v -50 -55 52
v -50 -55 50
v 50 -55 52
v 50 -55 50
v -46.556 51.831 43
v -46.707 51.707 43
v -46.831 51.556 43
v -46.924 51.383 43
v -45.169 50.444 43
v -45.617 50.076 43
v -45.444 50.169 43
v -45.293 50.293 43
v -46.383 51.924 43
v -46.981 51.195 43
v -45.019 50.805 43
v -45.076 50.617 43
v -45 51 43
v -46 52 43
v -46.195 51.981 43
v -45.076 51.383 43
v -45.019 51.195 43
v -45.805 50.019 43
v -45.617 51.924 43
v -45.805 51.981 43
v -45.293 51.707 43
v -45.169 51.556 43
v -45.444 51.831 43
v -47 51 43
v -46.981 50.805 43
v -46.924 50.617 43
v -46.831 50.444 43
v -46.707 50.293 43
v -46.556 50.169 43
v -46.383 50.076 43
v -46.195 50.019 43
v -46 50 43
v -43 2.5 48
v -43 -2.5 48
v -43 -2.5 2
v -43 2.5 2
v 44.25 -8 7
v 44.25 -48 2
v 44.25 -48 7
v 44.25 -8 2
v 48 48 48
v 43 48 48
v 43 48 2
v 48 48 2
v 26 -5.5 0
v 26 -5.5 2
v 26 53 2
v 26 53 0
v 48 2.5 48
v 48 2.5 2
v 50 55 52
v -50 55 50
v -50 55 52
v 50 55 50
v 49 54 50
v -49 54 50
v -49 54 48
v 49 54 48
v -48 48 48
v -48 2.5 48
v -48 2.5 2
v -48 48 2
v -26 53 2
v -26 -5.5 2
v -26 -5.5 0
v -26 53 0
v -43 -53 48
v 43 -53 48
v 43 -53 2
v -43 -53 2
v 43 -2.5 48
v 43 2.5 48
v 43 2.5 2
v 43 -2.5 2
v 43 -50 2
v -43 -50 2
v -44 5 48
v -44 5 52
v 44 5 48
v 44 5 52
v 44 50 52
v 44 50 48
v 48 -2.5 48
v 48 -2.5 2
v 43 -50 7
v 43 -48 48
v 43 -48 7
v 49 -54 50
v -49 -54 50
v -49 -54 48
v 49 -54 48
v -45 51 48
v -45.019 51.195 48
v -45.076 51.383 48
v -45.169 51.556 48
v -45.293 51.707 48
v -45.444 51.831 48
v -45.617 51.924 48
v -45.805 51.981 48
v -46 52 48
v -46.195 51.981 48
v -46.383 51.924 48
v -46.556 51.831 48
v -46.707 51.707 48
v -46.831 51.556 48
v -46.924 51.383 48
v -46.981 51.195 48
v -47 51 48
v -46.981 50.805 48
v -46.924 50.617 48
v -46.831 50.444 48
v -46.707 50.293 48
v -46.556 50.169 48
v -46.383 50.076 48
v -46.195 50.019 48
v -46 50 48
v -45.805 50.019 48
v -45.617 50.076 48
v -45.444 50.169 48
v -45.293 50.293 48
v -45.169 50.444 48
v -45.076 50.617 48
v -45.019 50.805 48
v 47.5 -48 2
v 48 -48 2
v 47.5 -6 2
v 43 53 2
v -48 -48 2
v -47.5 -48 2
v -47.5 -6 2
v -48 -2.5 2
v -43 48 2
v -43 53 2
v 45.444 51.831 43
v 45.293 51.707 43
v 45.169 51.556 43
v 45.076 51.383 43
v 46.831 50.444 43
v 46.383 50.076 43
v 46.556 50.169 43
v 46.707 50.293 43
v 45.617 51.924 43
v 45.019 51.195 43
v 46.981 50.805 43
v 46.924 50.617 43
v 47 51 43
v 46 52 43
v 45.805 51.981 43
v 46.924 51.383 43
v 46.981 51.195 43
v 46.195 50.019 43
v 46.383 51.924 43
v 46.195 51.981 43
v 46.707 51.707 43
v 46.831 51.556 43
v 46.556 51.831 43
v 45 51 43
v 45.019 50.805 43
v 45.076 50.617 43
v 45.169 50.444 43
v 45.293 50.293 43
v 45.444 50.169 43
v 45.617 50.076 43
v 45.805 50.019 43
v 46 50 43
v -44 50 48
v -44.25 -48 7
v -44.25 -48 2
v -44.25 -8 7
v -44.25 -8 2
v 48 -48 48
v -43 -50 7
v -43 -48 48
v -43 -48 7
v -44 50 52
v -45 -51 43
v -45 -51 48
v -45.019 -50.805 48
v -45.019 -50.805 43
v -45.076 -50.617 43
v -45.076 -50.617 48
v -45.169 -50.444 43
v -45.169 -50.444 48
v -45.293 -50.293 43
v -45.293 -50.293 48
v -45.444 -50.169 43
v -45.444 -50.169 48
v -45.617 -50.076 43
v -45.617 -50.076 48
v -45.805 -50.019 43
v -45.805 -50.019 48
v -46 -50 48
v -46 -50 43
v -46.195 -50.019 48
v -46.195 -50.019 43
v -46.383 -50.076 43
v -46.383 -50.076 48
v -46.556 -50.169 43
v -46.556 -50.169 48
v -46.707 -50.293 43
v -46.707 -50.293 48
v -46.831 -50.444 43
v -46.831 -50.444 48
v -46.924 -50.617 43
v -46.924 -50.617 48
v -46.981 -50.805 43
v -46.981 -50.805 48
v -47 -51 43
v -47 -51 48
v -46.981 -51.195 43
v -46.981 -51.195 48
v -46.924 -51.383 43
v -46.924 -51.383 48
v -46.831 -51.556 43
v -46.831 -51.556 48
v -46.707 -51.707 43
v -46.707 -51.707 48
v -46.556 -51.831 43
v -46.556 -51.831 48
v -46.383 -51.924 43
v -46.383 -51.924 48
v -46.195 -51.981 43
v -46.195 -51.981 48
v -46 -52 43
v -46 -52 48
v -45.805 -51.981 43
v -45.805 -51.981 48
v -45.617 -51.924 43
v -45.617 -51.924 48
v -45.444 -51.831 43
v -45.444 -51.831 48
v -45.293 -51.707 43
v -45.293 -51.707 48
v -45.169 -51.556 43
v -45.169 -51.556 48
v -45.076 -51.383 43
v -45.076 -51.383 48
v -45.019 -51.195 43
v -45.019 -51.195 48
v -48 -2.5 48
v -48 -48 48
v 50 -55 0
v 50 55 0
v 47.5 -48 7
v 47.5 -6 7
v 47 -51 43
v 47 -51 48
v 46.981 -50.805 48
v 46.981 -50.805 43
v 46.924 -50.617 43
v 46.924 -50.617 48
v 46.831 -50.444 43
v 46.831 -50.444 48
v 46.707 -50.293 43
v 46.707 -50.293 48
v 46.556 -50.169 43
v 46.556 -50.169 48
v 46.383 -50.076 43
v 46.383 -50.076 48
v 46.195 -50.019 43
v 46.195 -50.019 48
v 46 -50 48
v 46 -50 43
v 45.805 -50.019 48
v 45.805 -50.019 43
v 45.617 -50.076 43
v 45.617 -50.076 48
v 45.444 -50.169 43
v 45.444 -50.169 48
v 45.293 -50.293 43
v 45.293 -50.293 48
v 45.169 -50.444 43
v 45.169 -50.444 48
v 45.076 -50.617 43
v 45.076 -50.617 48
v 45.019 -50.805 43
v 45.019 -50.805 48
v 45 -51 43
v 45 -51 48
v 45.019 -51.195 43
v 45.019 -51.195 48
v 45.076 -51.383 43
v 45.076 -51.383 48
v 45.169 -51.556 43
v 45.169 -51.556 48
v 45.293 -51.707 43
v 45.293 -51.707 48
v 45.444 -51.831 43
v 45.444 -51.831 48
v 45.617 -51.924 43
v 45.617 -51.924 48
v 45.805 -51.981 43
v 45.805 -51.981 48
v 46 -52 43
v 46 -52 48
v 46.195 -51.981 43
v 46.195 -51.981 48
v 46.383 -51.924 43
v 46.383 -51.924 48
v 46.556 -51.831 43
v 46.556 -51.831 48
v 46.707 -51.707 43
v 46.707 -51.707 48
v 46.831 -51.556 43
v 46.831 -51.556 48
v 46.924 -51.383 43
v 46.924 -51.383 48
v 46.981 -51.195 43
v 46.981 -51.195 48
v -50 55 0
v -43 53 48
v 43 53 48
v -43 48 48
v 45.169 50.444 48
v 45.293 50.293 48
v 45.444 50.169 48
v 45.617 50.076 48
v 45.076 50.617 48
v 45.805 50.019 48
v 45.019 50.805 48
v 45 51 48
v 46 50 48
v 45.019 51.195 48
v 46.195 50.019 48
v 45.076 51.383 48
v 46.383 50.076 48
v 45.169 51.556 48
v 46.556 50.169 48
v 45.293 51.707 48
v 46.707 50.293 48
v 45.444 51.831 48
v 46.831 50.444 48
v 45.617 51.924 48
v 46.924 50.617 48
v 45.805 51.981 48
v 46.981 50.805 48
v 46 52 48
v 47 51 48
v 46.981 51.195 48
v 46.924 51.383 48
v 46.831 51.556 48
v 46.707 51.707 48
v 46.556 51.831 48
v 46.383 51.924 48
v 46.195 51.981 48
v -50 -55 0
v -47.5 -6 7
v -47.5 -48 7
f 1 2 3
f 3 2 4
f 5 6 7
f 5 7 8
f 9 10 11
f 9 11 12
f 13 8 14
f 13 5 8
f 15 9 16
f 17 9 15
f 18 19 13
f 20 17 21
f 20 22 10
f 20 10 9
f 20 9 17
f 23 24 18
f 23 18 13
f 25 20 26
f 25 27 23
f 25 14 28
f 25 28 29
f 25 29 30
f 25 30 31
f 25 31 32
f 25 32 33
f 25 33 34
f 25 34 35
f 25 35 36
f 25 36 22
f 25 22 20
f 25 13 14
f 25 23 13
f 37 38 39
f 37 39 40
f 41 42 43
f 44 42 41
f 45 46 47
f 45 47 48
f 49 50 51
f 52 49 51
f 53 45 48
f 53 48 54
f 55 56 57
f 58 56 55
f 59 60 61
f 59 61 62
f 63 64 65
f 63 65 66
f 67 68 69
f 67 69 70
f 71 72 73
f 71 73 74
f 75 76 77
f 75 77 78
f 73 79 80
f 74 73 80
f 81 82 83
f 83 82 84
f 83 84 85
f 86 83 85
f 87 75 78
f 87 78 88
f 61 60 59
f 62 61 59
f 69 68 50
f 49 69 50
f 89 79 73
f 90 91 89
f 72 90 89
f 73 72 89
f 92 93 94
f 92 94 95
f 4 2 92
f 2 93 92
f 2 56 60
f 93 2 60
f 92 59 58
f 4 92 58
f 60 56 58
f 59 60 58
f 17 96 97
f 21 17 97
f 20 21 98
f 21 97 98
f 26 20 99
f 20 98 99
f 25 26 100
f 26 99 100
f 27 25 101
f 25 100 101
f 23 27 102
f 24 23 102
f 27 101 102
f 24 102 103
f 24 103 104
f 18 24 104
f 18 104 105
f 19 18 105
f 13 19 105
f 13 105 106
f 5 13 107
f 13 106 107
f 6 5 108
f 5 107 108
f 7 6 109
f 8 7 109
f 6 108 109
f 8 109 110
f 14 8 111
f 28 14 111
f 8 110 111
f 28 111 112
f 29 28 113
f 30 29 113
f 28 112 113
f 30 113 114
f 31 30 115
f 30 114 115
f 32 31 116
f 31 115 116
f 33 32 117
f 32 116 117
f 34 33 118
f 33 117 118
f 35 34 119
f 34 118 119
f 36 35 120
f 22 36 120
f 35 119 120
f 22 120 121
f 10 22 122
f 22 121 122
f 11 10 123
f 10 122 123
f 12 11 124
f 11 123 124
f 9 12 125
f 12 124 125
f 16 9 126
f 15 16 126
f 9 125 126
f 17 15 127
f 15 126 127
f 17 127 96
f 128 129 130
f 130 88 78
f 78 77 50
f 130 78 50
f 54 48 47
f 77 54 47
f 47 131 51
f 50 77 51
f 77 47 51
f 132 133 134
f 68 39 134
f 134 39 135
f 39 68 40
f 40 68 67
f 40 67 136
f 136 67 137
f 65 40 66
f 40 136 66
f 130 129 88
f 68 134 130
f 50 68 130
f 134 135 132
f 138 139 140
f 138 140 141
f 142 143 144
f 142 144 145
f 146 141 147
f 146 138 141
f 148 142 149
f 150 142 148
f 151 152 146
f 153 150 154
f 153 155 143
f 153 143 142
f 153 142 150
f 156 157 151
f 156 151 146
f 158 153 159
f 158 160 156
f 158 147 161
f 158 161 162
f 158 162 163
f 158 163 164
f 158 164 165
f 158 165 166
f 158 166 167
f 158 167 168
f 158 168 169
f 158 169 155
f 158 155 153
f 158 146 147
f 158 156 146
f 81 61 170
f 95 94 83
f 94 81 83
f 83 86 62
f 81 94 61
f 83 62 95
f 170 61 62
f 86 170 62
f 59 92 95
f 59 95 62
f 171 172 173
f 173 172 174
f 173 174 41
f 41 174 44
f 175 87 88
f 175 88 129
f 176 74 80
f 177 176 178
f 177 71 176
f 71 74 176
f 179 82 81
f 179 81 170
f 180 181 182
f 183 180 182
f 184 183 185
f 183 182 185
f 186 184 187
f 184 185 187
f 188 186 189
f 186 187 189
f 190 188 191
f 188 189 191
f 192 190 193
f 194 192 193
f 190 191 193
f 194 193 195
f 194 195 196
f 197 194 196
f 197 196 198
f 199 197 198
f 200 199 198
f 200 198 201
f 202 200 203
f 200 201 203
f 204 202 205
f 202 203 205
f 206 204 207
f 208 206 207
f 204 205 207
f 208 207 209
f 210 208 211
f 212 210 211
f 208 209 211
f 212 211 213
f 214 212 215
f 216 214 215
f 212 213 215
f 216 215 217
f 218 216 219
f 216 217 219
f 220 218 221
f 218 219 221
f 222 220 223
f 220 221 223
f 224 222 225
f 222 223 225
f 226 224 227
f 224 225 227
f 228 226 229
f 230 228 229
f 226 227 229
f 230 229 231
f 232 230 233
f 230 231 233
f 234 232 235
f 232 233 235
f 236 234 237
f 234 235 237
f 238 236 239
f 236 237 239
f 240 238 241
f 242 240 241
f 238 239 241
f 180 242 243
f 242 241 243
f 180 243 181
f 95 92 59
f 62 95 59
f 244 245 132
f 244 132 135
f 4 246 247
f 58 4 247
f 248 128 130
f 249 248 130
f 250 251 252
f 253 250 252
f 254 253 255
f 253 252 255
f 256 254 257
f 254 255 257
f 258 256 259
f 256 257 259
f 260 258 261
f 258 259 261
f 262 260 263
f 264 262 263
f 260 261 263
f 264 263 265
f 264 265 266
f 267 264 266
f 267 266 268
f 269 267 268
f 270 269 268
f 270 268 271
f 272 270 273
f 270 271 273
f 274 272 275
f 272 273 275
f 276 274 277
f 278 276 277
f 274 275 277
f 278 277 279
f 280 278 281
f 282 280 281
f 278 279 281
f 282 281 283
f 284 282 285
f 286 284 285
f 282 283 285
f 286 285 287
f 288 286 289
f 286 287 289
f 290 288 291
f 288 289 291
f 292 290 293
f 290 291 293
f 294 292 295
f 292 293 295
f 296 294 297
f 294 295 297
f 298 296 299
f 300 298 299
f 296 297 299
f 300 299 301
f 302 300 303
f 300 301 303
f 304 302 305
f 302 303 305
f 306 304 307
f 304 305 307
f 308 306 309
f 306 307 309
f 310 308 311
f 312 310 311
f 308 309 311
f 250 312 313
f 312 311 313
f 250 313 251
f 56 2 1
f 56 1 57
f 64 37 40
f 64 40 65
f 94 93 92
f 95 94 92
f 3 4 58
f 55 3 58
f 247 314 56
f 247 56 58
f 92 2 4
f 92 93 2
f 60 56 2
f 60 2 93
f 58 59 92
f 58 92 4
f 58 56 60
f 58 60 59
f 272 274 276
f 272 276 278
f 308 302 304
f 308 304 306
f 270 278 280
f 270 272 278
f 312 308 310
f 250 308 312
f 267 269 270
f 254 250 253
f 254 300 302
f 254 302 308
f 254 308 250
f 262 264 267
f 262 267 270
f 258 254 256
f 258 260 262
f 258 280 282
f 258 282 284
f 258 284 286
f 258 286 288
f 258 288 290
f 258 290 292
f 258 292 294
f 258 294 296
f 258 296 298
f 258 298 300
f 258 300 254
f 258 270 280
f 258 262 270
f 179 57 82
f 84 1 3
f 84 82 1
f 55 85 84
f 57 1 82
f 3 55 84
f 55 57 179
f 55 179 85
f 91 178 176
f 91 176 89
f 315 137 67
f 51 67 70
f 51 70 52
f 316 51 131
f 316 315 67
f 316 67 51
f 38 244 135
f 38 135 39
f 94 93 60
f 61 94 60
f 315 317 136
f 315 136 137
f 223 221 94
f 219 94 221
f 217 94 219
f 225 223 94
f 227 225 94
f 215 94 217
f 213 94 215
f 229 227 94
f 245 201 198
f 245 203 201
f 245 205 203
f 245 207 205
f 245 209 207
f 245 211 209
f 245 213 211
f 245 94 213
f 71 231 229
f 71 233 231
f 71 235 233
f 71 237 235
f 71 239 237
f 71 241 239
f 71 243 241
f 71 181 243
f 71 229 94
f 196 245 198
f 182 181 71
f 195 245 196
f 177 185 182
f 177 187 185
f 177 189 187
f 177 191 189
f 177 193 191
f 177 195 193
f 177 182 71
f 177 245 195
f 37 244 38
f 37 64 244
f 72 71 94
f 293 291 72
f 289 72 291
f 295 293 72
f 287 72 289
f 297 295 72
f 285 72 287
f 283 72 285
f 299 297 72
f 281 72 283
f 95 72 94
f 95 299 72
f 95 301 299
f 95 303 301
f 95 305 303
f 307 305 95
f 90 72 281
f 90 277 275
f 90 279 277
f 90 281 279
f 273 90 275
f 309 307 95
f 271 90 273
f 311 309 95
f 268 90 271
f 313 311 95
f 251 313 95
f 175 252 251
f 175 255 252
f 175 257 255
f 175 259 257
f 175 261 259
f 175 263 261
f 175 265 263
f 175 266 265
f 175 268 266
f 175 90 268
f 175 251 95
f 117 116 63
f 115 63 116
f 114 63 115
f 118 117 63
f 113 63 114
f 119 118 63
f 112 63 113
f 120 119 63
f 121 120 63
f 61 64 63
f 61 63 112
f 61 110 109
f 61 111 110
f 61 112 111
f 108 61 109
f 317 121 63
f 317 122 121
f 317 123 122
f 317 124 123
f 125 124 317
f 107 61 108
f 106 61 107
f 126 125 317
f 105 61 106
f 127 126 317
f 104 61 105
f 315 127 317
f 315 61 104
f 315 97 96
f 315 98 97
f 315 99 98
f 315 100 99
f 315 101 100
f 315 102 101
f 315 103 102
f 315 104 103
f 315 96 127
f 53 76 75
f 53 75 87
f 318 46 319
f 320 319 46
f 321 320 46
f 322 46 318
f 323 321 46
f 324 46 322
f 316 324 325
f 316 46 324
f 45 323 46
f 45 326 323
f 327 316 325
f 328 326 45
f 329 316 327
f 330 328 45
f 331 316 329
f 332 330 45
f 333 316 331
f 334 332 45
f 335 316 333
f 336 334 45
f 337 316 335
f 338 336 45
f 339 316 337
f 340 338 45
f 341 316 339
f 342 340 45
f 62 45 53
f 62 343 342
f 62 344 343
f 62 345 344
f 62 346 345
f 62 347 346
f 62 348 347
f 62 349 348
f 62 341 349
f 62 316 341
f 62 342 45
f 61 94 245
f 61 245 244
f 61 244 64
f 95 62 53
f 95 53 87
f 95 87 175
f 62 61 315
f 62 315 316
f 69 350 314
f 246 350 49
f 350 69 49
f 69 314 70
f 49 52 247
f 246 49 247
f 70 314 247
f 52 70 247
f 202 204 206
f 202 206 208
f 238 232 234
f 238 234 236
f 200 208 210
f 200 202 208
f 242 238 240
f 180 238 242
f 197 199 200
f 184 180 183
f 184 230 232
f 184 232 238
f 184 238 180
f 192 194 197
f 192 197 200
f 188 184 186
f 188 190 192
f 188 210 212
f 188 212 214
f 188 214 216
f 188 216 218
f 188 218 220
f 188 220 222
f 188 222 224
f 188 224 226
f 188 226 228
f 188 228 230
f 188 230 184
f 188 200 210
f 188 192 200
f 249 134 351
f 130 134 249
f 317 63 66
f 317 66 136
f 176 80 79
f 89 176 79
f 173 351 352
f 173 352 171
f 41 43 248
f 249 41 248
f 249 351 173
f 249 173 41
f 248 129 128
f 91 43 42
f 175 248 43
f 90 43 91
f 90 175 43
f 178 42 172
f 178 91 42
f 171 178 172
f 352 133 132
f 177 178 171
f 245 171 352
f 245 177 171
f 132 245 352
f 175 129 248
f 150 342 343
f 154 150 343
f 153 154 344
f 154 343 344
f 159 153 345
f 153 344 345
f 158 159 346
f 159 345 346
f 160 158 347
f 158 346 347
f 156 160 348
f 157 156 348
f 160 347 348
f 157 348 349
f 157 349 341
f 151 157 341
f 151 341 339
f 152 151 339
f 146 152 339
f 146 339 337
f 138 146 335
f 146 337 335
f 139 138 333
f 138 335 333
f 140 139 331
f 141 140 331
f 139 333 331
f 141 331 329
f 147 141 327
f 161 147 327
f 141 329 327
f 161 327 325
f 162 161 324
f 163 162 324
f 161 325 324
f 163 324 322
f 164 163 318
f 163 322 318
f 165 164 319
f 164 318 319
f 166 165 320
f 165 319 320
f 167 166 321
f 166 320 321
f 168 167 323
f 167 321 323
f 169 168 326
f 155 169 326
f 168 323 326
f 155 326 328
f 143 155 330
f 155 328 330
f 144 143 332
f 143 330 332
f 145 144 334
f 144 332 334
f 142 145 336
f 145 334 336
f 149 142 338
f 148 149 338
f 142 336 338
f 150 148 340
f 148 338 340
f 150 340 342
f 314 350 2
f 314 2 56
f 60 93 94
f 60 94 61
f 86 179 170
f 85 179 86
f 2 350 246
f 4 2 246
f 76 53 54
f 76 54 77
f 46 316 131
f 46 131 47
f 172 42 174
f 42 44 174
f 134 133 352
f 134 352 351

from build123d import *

# Parameters (mm, degrees)
SKETCH_W        = 100
SKETCH_H        = 110
PAD_DEPTH       = 50
SKETCH001_W     = 98
SKETCH001_H     = 108
POCKET_DEPTH    = 2
POCKET001_DEPTH = 46
SKETCH003_W     = 52
SKETCH003_H     = 58.5
POCKET002_DEPTH = 5
SKETCH004_W     = 95
SKETCH004_H     = 44
SKETCH004_W_2   = 88.5
SKETCH004_H_2   = 40
PAD001_DEPTH    = 5
SKETCH006_R     = 1
POCKET003_DEPTH = 5
SKETCH005_W     = 100
SKETCH005_H     = 110
PAD002_DEPTH    = 2
SKETCH007_W     = 88
SKETCH007_H     = 45
POCKET004_DEPTH = 5


with BuildPart() as pad001:
    # Sketch → Pad (new body)
    with BuildSketch(Plane.XY):
        Rectangle(SKETCH_W, SKETCH_H)
    extrude(amount=PAD_DEPTH)

    # Sketch001 → Pocket (cut)
    with BuildSketch(Plane.XY.offset(50)):
        Rectangle(SKETCH001_W, SKETCH001_H)
    extrude(amount=-POCKET_DEPTH, mode=Mode.SUBTRACT)

    # Sketch002 → Pocket001 (cut)
    with BuildSketch(Plane.XY.offset(48)):
        Polygon((-43, 53), (43, 53), (43, 48), (48, 48), (48, 2.5), (43, 2.5), (43, -2.5), (48, -2.5), (48, -48), (43, -48), (43, -53), (-43, -53), (-43, -48), (-48, -48), (-48, -2.5), (-43, -2.5), (-43, 2.5), (-48, 2.5), (-48, 48), (-43, 48), align=None)
    extrude(amount=-POCKET001_DEPTH, mode=Mode.SUBTRACT)

    # Sketch003 → Pocket002 (cut)
    with BuildSketch(Plane.XY.offset(2)):
        with Locations((0, 23.75)):
            Rectangle(SKETCH003_W, SKETCH003_H)
    extrude(amount=-POCKET002_DEPTH, mode=Mode.SUBTRACT)

    # Sketch004 → Pad001 (new body)
    with BuildSketch(Plane.XY.offset(2)):
        with Locations((0, -28)):
            Rectangle(SKETCH004_W, SKETCH004_H)
        with Locations((0, -28)):
            Rectangle(SKETCH004_W_2, SKETCH004_H_2, mode=Mode.SUBTRACT)
    extrude(amount=PAD001_DEPTH)


with BuildPart() as pocket003:
    # Pocket003 base: copy of Pad001
    add(pad001.part)

    # Sketch006 → Pocket003 (cut)
    with BuildSketch(Plane.XY.offset(48)):
        with Locations((-46, 51)):
            Circle(SKETCH006_R)
        with Locations((-46, -51)):
            Circle(SKETCH006_R)
        with Locations((46, 51)):
            Circle(SKETCH006_R)
        with Locations((46, -51)):
            Circle(SKETCH006_R)
    extrude(amount=-POCKET003_DEPTH, mode=Mode.SUBTRACT)


with BuildPart() as pocket004:
    # Pad002 base: copy of Pad001
    add(pad001.part)

    # Sketch005 → Pad002 (new body, symmetric)
    with BuildSketch(Plane.XY.offset(50)):
        Rectangle(SKETCH005_W, SKETCH005_H)
    extrude(amount=PAD002_DEPTH, both=True)

    # Cut: cut Pad001
    add(pad001.part, mode=Mode.SUBTRACT)

    # Sketch007 → Pocket004 (cut)
    with BuildSketch(Plane.XY.offset(52)):
        with Locations((0, 27.5)):
            Rectangle(SKETCH007_W, SKETCH007_H)
    extrude(amount=-POCKET004_DEPTH, mode=Mode.SUBTRACT)


solid = Compound([pocket003.part, pocket004.part])
